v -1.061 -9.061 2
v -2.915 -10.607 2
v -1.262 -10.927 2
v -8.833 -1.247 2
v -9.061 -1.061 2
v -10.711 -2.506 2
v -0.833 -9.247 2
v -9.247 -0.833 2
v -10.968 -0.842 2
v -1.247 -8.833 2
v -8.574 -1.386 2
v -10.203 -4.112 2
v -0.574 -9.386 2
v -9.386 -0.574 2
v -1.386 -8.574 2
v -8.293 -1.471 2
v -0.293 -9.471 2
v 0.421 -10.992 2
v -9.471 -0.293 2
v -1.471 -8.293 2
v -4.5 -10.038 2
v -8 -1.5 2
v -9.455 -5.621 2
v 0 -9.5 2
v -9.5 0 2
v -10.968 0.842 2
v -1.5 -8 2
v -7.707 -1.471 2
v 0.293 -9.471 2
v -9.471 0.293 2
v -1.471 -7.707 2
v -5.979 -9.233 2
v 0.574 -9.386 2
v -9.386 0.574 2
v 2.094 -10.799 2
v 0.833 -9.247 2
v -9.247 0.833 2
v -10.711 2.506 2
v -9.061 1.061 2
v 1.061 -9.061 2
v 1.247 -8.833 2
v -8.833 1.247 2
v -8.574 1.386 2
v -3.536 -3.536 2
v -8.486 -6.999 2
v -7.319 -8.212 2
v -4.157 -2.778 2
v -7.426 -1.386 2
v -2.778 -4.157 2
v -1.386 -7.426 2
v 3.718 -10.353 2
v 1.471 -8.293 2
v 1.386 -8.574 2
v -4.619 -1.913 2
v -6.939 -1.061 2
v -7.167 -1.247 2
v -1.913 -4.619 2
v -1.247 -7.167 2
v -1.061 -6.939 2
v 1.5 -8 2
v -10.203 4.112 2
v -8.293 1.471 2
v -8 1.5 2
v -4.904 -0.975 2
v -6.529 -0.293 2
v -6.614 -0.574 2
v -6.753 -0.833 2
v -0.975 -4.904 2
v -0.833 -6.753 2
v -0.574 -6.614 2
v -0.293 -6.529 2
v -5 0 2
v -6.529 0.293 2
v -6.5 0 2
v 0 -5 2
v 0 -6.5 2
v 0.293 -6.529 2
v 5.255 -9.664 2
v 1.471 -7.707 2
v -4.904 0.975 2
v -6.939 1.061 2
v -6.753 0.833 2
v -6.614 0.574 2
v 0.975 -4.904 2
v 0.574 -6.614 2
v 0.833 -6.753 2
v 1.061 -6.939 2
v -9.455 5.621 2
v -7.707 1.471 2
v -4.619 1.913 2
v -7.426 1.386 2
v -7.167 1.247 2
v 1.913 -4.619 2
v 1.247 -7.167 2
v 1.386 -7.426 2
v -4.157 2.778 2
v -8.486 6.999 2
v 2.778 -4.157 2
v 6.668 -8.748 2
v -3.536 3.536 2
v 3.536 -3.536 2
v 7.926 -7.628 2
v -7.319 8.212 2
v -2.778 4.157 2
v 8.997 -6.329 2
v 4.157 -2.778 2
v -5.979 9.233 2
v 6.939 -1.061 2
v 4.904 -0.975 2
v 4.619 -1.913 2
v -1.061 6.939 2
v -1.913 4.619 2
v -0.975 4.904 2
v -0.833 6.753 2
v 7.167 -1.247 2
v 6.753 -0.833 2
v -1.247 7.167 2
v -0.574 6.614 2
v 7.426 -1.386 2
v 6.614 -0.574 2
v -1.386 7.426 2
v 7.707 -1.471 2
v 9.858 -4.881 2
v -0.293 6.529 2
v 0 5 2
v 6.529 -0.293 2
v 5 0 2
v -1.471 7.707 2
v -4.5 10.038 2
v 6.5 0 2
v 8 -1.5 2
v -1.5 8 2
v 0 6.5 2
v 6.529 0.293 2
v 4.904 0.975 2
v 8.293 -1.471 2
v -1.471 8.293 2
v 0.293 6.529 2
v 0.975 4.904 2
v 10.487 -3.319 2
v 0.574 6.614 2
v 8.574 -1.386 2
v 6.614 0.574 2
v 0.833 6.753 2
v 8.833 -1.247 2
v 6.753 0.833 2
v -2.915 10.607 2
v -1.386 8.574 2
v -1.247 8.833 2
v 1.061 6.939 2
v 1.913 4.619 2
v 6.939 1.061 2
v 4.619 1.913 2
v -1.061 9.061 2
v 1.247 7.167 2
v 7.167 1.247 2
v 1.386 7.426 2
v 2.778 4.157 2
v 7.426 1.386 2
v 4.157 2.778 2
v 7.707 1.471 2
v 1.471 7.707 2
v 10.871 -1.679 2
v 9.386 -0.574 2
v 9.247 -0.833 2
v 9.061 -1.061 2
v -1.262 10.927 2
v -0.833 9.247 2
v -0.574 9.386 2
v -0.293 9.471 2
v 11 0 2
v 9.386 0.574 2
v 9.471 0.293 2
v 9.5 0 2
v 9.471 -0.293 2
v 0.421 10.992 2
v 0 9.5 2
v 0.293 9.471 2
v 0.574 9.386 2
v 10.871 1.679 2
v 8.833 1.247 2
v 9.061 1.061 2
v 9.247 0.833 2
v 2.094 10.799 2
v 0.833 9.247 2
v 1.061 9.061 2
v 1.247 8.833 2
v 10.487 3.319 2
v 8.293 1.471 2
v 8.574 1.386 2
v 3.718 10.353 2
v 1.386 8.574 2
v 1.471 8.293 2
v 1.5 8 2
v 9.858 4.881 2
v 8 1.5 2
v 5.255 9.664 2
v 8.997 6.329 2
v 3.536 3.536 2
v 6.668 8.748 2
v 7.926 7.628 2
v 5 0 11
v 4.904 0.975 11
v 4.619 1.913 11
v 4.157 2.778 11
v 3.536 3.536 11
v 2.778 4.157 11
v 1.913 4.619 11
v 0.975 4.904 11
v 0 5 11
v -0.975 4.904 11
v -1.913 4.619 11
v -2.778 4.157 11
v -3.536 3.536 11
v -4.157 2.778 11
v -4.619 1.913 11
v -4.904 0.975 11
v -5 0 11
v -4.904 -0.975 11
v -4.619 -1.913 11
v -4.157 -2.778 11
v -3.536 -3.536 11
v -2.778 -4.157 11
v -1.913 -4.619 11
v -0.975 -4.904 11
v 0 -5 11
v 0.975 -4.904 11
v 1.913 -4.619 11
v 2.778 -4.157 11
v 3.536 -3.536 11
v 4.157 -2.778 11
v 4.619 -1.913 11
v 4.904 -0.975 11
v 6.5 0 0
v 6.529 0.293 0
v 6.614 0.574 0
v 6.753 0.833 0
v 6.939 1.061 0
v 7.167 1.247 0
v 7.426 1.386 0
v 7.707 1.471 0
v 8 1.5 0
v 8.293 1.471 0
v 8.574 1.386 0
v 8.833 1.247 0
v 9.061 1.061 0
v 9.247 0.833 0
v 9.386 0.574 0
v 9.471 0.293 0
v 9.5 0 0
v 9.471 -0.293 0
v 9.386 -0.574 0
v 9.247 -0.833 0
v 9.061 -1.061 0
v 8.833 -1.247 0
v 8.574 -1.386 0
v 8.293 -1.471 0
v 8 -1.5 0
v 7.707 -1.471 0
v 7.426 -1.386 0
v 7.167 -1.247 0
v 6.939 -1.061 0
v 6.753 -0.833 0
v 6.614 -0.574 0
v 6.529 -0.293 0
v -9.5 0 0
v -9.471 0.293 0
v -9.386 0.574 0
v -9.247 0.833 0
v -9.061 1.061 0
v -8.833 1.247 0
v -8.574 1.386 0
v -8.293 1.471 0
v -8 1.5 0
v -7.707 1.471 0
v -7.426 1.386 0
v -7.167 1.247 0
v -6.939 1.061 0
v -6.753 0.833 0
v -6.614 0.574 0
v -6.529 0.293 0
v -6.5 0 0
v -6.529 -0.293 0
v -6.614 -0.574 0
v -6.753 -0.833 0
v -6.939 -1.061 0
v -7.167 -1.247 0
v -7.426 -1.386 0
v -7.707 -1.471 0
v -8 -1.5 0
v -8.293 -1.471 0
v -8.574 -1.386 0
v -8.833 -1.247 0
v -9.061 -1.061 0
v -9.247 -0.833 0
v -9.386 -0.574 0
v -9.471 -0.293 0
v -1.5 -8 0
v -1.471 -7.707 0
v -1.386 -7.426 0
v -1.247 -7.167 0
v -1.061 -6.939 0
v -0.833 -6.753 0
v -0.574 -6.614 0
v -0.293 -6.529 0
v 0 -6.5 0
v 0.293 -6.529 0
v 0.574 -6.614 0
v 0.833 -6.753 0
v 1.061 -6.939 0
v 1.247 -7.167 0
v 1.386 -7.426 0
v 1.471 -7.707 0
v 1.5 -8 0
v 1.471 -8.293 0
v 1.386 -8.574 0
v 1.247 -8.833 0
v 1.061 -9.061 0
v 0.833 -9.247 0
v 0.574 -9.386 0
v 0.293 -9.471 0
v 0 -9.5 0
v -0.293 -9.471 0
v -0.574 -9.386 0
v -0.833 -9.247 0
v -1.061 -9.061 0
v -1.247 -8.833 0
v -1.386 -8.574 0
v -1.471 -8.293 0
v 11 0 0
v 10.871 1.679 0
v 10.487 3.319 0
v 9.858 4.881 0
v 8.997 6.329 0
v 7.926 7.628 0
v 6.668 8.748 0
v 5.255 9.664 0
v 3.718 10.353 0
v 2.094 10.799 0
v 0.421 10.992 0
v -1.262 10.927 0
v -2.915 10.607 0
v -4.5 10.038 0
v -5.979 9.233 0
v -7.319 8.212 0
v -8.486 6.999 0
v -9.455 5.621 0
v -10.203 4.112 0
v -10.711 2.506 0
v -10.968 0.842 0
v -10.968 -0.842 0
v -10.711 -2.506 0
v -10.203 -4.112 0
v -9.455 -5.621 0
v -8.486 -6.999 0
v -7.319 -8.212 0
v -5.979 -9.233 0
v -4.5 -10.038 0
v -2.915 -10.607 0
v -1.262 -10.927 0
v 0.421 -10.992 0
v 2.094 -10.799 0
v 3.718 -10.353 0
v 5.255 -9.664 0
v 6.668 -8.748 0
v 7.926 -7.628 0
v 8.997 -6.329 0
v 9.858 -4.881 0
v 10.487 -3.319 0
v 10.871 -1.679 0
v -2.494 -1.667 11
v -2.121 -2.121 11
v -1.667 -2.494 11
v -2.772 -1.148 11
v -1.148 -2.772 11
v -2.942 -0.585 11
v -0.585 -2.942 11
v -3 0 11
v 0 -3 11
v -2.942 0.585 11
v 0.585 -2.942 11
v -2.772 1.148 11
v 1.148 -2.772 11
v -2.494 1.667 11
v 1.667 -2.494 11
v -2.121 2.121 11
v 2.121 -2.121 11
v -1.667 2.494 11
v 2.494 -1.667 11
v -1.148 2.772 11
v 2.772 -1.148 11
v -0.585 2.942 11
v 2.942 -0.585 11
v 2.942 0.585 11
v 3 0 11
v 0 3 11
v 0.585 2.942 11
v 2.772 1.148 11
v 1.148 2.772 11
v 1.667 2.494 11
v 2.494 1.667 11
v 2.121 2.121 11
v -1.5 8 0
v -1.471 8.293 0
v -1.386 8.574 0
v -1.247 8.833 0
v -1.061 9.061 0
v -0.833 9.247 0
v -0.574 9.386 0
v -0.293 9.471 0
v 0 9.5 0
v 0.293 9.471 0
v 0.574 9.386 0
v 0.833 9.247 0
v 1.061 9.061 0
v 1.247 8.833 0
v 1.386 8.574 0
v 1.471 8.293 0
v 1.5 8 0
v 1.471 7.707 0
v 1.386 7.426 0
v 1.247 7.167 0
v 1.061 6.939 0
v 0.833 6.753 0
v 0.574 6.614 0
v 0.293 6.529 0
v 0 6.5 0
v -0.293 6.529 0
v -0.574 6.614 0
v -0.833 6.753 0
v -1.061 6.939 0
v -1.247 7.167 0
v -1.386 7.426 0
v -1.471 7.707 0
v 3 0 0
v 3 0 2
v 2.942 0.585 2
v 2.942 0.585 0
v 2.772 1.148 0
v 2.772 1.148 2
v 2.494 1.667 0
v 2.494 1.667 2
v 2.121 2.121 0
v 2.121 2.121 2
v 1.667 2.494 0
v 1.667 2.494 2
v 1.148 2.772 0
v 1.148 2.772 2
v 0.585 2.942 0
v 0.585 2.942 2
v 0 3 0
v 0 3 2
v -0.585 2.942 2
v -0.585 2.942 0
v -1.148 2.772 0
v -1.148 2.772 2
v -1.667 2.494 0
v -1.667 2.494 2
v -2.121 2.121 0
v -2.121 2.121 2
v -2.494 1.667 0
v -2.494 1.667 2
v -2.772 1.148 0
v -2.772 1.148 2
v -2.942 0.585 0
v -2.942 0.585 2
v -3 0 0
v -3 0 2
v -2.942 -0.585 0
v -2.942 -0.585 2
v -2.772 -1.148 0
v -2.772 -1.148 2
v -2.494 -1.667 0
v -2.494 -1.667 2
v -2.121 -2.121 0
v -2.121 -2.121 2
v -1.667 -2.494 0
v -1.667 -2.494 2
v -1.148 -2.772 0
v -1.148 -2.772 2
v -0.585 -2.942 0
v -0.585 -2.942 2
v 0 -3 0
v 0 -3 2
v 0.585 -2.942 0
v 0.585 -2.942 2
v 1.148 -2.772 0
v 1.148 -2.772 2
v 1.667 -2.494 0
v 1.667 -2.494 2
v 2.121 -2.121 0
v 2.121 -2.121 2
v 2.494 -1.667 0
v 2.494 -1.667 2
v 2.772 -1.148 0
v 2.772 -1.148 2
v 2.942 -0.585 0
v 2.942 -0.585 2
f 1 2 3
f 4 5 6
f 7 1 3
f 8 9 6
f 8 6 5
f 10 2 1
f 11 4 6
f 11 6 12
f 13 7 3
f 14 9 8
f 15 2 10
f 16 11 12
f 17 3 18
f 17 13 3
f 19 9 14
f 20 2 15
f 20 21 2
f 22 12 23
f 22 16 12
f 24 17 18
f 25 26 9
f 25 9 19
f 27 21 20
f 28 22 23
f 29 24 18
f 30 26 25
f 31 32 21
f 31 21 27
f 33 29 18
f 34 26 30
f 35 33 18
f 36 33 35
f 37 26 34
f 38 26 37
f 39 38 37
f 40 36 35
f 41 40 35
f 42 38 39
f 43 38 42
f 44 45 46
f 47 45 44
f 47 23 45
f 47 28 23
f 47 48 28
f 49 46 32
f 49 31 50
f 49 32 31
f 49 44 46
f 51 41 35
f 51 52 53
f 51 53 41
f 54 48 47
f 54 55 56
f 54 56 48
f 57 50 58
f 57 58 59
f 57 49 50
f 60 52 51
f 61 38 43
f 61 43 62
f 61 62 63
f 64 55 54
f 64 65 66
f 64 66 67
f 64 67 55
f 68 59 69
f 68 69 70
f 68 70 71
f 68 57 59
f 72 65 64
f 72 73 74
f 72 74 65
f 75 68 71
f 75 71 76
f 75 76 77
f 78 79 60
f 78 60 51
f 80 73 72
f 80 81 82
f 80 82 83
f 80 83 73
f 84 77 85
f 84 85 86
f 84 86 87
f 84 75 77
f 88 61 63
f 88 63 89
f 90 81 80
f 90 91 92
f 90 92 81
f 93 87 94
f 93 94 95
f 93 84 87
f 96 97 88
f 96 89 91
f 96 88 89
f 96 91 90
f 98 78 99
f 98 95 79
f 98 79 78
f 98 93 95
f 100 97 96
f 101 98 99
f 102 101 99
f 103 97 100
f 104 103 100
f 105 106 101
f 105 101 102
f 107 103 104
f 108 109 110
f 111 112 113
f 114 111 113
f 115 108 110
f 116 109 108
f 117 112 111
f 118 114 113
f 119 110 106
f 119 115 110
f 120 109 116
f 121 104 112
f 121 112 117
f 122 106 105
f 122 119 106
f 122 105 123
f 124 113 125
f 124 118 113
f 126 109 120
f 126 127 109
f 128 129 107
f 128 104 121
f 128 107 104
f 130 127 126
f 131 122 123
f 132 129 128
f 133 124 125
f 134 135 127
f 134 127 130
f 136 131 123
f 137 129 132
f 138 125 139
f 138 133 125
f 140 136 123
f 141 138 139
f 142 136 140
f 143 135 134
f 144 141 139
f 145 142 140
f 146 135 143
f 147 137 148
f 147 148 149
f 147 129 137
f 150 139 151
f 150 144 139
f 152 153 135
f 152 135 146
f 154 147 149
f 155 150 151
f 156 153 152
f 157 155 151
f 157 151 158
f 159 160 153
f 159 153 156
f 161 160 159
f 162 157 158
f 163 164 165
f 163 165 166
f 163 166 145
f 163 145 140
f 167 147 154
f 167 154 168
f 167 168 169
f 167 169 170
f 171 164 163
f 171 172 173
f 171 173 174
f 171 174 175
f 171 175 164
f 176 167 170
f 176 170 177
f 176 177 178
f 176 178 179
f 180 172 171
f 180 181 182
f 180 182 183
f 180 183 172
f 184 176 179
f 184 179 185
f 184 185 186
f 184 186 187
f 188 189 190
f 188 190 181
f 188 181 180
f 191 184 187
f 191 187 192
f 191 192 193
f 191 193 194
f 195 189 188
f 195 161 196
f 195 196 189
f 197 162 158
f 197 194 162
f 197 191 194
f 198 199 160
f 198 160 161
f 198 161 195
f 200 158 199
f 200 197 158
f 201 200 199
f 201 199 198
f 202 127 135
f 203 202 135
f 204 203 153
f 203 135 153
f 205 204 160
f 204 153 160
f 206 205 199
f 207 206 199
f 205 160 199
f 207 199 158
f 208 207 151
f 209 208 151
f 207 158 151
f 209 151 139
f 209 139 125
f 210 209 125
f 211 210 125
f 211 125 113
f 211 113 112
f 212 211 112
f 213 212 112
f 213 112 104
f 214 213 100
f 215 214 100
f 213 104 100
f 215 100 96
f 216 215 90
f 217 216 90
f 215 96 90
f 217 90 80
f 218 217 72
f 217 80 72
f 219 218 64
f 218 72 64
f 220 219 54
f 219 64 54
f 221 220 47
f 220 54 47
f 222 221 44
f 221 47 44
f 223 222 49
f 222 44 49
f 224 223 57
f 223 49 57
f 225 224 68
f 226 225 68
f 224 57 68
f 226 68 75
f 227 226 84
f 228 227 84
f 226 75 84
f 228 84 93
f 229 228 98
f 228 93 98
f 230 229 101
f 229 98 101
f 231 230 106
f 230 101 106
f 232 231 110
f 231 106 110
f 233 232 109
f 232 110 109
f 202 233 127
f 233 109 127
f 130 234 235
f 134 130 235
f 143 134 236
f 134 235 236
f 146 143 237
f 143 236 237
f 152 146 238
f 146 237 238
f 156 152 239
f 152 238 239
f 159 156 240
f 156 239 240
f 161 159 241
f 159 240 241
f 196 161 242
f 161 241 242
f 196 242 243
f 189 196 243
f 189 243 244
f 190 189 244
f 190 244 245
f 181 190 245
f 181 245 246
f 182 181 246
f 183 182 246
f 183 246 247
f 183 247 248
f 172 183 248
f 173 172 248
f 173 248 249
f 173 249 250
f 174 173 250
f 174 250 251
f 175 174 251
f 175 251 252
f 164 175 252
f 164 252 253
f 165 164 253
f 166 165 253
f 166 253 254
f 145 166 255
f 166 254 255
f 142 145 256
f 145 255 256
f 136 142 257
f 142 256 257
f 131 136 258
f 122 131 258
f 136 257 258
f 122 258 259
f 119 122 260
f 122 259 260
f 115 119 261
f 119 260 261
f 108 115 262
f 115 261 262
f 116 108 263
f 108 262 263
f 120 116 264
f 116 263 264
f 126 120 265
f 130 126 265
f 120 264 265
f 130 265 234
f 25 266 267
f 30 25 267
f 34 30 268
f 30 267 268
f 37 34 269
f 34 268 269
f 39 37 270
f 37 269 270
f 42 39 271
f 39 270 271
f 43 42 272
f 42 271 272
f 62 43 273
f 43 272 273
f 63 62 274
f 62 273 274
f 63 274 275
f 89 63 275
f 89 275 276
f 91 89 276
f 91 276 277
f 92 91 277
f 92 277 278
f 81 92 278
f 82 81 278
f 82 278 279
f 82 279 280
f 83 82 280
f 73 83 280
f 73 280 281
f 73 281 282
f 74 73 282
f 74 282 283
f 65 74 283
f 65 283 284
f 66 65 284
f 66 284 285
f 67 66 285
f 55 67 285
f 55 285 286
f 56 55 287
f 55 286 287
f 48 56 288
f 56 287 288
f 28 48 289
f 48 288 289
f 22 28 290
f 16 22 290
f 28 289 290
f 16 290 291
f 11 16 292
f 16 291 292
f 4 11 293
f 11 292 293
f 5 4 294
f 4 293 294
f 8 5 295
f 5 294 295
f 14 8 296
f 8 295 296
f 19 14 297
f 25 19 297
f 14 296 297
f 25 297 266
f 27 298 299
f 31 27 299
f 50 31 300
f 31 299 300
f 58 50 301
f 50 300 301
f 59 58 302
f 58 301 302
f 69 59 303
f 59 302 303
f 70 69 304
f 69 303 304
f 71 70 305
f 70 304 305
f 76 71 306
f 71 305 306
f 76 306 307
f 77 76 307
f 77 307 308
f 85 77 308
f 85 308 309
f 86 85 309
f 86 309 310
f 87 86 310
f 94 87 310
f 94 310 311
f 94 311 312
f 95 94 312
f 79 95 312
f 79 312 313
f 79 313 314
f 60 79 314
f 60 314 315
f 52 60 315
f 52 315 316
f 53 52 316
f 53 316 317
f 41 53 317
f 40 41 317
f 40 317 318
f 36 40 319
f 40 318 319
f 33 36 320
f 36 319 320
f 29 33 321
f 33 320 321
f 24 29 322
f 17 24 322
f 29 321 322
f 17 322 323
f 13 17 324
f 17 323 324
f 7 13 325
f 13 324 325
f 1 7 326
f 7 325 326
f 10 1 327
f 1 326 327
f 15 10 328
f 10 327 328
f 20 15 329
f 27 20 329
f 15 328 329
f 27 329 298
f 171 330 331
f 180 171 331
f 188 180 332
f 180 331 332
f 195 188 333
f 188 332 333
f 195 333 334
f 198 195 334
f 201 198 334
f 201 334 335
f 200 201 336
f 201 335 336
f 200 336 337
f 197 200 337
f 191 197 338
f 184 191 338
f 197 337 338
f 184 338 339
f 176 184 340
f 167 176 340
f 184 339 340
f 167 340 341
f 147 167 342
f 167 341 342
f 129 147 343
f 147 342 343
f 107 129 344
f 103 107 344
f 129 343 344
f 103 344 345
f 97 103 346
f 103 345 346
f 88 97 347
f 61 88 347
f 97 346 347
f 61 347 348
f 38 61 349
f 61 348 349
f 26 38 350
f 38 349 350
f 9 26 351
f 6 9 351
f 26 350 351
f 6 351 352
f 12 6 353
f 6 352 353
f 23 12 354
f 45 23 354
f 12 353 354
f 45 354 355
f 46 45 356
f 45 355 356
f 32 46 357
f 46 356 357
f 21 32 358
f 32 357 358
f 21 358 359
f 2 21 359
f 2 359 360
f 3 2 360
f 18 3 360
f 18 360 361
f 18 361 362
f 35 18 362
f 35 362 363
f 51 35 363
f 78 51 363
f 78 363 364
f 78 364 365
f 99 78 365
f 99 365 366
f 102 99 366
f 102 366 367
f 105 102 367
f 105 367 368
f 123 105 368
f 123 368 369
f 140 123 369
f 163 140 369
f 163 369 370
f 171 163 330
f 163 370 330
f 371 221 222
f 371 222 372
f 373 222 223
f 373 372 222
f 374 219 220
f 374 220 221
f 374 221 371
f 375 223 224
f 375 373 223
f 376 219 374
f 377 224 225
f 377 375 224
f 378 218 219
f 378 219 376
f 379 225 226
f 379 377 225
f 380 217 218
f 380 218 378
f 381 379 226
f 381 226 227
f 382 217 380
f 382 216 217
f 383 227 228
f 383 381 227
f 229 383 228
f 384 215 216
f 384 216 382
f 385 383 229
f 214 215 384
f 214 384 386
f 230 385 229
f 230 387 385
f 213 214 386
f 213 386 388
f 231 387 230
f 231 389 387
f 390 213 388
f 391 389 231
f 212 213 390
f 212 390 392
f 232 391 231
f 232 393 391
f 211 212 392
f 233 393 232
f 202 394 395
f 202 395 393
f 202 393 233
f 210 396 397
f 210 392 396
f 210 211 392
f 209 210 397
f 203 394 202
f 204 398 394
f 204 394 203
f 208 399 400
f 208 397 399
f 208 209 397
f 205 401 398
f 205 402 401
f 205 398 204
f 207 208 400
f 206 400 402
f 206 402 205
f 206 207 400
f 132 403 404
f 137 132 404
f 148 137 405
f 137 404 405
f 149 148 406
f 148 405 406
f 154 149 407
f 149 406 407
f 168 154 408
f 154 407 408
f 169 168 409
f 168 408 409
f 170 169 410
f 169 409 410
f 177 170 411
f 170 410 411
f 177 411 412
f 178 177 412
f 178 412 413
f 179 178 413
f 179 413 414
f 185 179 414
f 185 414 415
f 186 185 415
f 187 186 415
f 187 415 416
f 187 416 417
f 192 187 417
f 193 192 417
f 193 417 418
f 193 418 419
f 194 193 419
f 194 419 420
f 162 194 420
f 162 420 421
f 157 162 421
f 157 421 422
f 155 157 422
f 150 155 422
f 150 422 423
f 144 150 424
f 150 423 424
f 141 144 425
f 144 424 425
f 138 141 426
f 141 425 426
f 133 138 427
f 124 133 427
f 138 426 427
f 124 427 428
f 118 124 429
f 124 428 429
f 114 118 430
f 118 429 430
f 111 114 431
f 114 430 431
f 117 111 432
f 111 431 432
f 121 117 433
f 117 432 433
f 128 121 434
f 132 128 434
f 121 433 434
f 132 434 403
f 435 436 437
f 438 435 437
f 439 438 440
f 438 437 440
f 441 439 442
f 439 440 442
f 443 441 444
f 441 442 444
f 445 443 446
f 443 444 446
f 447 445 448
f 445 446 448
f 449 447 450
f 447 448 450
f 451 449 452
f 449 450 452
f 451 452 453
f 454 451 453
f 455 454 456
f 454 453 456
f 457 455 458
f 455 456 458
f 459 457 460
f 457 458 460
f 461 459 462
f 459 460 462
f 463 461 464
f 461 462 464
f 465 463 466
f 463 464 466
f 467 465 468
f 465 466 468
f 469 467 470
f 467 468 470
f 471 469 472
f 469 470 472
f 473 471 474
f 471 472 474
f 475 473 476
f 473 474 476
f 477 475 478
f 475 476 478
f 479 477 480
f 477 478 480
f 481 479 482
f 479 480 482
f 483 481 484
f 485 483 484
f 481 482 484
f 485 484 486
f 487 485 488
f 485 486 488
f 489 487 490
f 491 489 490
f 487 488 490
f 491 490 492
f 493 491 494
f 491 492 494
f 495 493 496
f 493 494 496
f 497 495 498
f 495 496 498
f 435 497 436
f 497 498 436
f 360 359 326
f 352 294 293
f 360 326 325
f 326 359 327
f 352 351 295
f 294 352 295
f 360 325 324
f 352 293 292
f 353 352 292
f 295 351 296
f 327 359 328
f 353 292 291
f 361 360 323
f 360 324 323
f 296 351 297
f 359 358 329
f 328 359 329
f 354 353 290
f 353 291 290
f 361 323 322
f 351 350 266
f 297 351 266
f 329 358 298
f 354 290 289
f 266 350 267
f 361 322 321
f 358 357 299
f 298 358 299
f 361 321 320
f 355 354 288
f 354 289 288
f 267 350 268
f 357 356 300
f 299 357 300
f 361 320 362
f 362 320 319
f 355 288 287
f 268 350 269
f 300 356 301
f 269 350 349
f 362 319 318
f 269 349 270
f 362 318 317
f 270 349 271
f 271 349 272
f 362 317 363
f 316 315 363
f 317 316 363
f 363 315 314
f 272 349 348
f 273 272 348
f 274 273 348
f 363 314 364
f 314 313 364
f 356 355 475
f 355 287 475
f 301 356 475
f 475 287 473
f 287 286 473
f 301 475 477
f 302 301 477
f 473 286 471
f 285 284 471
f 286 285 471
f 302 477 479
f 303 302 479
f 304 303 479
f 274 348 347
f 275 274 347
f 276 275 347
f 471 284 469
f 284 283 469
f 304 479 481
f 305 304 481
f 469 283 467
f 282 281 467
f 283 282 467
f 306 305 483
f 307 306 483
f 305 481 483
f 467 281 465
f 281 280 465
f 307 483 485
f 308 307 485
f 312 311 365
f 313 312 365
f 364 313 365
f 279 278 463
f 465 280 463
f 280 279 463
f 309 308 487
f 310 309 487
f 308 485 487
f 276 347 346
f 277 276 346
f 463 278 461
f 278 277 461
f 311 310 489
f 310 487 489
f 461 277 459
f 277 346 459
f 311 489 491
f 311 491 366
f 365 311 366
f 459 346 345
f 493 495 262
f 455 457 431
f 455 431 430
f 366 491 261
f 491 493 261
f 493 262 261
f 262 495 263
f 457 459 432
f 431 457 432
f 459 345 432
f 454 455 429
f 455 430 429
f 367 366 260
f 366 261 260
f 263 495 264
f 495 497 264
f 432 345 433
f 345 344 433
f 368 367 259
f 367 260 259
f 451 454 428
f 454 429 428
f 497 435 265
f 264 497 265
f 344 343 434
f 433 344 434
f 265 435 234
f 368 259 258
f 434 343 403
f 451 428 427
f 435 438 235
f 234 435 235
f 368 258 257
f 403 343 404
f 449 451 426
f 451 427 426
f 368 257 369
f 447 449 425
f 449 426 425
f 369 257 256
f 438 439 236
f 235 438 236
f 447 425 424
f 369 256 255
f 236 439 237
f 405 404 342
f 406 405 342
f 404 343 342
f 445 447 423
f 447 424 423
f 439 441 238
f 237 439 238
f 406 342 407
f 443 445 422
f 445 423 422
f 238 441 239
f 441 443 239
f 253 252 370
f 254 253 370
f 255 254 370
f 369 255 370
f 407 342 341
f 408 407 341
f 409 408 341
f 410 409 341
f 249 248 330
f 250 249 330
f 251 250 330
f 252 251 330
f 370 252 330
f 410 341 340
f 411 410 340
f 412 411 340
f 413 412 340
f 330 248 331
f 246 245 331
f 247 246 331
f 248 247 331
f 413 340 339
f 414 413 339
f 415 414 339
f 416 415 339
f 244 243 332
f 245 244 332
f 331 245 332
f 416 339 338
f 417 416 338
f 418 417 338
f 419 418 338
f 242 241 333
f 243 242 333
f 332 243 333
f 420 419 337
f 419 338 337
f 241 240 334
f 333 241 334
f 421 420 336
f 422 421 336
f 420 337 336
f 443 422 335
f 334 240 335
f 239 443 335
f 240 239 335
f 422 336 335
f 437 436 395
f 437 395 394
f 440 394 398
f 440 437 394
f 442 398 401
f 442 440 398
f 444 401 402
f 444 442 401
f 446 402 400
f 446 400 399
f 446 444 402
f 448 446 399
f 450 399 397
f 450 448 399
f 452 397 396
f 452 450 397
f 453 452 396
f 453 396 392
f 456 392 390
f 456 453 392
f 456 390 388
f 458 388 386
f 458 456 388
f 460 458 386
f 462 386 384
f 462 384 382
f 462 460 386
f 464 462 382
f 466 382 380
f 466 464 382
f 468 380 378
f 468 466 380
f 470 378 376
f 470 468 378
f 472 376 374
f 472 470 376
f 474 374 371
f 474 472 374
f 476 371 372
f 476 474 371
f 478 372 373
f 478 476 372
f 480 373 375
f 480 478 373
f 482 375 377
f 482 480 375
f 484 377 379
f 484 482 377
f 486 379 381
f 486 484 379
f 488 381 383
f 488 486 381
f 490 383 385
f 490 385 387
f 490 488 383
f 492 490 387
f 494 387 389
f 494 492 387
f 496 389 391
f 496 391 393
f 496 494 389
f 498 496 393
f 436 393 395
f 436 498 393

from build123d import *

# Parameters (mm, degrees)
F0_R     = 11
F1_DEPTH = 2
F2_R     = 5
F2_R_2   = 3
F3_DEPTH = 9
F4_R     = 3
F5_DEPTH = 2
F7_D     = 3


with BuildPart() as f1:
    # F0 (on Top) → F1 (new body)
    with BuildSketch(Plane.XY):
        Circle(F0_R)
    extrude(amount=F1_DEPTH)

    # F2 (on face) → F3 (join)
    with BuildSketch(Plane.XY.offset(2)):
        Circle(F2_R)
        Circle(F2_R_2, mode=Mode.SUBTRACT)
    extrude(amount=F3_DEPTH)

    # F4 (on face) → F5 (cut, through all)
    with BuildSketch(Plane.XY.offset(2)):
        Circle(F4_R)
    extrude(amount=-F5_DEPTH, mode=Mode.SUBTRACT)

    # F7 (through all)
    with Locations(Plane.XY.offset(2)):
        with Locations((0, 8), (8, 0), (0, -8), (-8, 0)):
            Hole(F7_D / 2)


solid = f1.part
